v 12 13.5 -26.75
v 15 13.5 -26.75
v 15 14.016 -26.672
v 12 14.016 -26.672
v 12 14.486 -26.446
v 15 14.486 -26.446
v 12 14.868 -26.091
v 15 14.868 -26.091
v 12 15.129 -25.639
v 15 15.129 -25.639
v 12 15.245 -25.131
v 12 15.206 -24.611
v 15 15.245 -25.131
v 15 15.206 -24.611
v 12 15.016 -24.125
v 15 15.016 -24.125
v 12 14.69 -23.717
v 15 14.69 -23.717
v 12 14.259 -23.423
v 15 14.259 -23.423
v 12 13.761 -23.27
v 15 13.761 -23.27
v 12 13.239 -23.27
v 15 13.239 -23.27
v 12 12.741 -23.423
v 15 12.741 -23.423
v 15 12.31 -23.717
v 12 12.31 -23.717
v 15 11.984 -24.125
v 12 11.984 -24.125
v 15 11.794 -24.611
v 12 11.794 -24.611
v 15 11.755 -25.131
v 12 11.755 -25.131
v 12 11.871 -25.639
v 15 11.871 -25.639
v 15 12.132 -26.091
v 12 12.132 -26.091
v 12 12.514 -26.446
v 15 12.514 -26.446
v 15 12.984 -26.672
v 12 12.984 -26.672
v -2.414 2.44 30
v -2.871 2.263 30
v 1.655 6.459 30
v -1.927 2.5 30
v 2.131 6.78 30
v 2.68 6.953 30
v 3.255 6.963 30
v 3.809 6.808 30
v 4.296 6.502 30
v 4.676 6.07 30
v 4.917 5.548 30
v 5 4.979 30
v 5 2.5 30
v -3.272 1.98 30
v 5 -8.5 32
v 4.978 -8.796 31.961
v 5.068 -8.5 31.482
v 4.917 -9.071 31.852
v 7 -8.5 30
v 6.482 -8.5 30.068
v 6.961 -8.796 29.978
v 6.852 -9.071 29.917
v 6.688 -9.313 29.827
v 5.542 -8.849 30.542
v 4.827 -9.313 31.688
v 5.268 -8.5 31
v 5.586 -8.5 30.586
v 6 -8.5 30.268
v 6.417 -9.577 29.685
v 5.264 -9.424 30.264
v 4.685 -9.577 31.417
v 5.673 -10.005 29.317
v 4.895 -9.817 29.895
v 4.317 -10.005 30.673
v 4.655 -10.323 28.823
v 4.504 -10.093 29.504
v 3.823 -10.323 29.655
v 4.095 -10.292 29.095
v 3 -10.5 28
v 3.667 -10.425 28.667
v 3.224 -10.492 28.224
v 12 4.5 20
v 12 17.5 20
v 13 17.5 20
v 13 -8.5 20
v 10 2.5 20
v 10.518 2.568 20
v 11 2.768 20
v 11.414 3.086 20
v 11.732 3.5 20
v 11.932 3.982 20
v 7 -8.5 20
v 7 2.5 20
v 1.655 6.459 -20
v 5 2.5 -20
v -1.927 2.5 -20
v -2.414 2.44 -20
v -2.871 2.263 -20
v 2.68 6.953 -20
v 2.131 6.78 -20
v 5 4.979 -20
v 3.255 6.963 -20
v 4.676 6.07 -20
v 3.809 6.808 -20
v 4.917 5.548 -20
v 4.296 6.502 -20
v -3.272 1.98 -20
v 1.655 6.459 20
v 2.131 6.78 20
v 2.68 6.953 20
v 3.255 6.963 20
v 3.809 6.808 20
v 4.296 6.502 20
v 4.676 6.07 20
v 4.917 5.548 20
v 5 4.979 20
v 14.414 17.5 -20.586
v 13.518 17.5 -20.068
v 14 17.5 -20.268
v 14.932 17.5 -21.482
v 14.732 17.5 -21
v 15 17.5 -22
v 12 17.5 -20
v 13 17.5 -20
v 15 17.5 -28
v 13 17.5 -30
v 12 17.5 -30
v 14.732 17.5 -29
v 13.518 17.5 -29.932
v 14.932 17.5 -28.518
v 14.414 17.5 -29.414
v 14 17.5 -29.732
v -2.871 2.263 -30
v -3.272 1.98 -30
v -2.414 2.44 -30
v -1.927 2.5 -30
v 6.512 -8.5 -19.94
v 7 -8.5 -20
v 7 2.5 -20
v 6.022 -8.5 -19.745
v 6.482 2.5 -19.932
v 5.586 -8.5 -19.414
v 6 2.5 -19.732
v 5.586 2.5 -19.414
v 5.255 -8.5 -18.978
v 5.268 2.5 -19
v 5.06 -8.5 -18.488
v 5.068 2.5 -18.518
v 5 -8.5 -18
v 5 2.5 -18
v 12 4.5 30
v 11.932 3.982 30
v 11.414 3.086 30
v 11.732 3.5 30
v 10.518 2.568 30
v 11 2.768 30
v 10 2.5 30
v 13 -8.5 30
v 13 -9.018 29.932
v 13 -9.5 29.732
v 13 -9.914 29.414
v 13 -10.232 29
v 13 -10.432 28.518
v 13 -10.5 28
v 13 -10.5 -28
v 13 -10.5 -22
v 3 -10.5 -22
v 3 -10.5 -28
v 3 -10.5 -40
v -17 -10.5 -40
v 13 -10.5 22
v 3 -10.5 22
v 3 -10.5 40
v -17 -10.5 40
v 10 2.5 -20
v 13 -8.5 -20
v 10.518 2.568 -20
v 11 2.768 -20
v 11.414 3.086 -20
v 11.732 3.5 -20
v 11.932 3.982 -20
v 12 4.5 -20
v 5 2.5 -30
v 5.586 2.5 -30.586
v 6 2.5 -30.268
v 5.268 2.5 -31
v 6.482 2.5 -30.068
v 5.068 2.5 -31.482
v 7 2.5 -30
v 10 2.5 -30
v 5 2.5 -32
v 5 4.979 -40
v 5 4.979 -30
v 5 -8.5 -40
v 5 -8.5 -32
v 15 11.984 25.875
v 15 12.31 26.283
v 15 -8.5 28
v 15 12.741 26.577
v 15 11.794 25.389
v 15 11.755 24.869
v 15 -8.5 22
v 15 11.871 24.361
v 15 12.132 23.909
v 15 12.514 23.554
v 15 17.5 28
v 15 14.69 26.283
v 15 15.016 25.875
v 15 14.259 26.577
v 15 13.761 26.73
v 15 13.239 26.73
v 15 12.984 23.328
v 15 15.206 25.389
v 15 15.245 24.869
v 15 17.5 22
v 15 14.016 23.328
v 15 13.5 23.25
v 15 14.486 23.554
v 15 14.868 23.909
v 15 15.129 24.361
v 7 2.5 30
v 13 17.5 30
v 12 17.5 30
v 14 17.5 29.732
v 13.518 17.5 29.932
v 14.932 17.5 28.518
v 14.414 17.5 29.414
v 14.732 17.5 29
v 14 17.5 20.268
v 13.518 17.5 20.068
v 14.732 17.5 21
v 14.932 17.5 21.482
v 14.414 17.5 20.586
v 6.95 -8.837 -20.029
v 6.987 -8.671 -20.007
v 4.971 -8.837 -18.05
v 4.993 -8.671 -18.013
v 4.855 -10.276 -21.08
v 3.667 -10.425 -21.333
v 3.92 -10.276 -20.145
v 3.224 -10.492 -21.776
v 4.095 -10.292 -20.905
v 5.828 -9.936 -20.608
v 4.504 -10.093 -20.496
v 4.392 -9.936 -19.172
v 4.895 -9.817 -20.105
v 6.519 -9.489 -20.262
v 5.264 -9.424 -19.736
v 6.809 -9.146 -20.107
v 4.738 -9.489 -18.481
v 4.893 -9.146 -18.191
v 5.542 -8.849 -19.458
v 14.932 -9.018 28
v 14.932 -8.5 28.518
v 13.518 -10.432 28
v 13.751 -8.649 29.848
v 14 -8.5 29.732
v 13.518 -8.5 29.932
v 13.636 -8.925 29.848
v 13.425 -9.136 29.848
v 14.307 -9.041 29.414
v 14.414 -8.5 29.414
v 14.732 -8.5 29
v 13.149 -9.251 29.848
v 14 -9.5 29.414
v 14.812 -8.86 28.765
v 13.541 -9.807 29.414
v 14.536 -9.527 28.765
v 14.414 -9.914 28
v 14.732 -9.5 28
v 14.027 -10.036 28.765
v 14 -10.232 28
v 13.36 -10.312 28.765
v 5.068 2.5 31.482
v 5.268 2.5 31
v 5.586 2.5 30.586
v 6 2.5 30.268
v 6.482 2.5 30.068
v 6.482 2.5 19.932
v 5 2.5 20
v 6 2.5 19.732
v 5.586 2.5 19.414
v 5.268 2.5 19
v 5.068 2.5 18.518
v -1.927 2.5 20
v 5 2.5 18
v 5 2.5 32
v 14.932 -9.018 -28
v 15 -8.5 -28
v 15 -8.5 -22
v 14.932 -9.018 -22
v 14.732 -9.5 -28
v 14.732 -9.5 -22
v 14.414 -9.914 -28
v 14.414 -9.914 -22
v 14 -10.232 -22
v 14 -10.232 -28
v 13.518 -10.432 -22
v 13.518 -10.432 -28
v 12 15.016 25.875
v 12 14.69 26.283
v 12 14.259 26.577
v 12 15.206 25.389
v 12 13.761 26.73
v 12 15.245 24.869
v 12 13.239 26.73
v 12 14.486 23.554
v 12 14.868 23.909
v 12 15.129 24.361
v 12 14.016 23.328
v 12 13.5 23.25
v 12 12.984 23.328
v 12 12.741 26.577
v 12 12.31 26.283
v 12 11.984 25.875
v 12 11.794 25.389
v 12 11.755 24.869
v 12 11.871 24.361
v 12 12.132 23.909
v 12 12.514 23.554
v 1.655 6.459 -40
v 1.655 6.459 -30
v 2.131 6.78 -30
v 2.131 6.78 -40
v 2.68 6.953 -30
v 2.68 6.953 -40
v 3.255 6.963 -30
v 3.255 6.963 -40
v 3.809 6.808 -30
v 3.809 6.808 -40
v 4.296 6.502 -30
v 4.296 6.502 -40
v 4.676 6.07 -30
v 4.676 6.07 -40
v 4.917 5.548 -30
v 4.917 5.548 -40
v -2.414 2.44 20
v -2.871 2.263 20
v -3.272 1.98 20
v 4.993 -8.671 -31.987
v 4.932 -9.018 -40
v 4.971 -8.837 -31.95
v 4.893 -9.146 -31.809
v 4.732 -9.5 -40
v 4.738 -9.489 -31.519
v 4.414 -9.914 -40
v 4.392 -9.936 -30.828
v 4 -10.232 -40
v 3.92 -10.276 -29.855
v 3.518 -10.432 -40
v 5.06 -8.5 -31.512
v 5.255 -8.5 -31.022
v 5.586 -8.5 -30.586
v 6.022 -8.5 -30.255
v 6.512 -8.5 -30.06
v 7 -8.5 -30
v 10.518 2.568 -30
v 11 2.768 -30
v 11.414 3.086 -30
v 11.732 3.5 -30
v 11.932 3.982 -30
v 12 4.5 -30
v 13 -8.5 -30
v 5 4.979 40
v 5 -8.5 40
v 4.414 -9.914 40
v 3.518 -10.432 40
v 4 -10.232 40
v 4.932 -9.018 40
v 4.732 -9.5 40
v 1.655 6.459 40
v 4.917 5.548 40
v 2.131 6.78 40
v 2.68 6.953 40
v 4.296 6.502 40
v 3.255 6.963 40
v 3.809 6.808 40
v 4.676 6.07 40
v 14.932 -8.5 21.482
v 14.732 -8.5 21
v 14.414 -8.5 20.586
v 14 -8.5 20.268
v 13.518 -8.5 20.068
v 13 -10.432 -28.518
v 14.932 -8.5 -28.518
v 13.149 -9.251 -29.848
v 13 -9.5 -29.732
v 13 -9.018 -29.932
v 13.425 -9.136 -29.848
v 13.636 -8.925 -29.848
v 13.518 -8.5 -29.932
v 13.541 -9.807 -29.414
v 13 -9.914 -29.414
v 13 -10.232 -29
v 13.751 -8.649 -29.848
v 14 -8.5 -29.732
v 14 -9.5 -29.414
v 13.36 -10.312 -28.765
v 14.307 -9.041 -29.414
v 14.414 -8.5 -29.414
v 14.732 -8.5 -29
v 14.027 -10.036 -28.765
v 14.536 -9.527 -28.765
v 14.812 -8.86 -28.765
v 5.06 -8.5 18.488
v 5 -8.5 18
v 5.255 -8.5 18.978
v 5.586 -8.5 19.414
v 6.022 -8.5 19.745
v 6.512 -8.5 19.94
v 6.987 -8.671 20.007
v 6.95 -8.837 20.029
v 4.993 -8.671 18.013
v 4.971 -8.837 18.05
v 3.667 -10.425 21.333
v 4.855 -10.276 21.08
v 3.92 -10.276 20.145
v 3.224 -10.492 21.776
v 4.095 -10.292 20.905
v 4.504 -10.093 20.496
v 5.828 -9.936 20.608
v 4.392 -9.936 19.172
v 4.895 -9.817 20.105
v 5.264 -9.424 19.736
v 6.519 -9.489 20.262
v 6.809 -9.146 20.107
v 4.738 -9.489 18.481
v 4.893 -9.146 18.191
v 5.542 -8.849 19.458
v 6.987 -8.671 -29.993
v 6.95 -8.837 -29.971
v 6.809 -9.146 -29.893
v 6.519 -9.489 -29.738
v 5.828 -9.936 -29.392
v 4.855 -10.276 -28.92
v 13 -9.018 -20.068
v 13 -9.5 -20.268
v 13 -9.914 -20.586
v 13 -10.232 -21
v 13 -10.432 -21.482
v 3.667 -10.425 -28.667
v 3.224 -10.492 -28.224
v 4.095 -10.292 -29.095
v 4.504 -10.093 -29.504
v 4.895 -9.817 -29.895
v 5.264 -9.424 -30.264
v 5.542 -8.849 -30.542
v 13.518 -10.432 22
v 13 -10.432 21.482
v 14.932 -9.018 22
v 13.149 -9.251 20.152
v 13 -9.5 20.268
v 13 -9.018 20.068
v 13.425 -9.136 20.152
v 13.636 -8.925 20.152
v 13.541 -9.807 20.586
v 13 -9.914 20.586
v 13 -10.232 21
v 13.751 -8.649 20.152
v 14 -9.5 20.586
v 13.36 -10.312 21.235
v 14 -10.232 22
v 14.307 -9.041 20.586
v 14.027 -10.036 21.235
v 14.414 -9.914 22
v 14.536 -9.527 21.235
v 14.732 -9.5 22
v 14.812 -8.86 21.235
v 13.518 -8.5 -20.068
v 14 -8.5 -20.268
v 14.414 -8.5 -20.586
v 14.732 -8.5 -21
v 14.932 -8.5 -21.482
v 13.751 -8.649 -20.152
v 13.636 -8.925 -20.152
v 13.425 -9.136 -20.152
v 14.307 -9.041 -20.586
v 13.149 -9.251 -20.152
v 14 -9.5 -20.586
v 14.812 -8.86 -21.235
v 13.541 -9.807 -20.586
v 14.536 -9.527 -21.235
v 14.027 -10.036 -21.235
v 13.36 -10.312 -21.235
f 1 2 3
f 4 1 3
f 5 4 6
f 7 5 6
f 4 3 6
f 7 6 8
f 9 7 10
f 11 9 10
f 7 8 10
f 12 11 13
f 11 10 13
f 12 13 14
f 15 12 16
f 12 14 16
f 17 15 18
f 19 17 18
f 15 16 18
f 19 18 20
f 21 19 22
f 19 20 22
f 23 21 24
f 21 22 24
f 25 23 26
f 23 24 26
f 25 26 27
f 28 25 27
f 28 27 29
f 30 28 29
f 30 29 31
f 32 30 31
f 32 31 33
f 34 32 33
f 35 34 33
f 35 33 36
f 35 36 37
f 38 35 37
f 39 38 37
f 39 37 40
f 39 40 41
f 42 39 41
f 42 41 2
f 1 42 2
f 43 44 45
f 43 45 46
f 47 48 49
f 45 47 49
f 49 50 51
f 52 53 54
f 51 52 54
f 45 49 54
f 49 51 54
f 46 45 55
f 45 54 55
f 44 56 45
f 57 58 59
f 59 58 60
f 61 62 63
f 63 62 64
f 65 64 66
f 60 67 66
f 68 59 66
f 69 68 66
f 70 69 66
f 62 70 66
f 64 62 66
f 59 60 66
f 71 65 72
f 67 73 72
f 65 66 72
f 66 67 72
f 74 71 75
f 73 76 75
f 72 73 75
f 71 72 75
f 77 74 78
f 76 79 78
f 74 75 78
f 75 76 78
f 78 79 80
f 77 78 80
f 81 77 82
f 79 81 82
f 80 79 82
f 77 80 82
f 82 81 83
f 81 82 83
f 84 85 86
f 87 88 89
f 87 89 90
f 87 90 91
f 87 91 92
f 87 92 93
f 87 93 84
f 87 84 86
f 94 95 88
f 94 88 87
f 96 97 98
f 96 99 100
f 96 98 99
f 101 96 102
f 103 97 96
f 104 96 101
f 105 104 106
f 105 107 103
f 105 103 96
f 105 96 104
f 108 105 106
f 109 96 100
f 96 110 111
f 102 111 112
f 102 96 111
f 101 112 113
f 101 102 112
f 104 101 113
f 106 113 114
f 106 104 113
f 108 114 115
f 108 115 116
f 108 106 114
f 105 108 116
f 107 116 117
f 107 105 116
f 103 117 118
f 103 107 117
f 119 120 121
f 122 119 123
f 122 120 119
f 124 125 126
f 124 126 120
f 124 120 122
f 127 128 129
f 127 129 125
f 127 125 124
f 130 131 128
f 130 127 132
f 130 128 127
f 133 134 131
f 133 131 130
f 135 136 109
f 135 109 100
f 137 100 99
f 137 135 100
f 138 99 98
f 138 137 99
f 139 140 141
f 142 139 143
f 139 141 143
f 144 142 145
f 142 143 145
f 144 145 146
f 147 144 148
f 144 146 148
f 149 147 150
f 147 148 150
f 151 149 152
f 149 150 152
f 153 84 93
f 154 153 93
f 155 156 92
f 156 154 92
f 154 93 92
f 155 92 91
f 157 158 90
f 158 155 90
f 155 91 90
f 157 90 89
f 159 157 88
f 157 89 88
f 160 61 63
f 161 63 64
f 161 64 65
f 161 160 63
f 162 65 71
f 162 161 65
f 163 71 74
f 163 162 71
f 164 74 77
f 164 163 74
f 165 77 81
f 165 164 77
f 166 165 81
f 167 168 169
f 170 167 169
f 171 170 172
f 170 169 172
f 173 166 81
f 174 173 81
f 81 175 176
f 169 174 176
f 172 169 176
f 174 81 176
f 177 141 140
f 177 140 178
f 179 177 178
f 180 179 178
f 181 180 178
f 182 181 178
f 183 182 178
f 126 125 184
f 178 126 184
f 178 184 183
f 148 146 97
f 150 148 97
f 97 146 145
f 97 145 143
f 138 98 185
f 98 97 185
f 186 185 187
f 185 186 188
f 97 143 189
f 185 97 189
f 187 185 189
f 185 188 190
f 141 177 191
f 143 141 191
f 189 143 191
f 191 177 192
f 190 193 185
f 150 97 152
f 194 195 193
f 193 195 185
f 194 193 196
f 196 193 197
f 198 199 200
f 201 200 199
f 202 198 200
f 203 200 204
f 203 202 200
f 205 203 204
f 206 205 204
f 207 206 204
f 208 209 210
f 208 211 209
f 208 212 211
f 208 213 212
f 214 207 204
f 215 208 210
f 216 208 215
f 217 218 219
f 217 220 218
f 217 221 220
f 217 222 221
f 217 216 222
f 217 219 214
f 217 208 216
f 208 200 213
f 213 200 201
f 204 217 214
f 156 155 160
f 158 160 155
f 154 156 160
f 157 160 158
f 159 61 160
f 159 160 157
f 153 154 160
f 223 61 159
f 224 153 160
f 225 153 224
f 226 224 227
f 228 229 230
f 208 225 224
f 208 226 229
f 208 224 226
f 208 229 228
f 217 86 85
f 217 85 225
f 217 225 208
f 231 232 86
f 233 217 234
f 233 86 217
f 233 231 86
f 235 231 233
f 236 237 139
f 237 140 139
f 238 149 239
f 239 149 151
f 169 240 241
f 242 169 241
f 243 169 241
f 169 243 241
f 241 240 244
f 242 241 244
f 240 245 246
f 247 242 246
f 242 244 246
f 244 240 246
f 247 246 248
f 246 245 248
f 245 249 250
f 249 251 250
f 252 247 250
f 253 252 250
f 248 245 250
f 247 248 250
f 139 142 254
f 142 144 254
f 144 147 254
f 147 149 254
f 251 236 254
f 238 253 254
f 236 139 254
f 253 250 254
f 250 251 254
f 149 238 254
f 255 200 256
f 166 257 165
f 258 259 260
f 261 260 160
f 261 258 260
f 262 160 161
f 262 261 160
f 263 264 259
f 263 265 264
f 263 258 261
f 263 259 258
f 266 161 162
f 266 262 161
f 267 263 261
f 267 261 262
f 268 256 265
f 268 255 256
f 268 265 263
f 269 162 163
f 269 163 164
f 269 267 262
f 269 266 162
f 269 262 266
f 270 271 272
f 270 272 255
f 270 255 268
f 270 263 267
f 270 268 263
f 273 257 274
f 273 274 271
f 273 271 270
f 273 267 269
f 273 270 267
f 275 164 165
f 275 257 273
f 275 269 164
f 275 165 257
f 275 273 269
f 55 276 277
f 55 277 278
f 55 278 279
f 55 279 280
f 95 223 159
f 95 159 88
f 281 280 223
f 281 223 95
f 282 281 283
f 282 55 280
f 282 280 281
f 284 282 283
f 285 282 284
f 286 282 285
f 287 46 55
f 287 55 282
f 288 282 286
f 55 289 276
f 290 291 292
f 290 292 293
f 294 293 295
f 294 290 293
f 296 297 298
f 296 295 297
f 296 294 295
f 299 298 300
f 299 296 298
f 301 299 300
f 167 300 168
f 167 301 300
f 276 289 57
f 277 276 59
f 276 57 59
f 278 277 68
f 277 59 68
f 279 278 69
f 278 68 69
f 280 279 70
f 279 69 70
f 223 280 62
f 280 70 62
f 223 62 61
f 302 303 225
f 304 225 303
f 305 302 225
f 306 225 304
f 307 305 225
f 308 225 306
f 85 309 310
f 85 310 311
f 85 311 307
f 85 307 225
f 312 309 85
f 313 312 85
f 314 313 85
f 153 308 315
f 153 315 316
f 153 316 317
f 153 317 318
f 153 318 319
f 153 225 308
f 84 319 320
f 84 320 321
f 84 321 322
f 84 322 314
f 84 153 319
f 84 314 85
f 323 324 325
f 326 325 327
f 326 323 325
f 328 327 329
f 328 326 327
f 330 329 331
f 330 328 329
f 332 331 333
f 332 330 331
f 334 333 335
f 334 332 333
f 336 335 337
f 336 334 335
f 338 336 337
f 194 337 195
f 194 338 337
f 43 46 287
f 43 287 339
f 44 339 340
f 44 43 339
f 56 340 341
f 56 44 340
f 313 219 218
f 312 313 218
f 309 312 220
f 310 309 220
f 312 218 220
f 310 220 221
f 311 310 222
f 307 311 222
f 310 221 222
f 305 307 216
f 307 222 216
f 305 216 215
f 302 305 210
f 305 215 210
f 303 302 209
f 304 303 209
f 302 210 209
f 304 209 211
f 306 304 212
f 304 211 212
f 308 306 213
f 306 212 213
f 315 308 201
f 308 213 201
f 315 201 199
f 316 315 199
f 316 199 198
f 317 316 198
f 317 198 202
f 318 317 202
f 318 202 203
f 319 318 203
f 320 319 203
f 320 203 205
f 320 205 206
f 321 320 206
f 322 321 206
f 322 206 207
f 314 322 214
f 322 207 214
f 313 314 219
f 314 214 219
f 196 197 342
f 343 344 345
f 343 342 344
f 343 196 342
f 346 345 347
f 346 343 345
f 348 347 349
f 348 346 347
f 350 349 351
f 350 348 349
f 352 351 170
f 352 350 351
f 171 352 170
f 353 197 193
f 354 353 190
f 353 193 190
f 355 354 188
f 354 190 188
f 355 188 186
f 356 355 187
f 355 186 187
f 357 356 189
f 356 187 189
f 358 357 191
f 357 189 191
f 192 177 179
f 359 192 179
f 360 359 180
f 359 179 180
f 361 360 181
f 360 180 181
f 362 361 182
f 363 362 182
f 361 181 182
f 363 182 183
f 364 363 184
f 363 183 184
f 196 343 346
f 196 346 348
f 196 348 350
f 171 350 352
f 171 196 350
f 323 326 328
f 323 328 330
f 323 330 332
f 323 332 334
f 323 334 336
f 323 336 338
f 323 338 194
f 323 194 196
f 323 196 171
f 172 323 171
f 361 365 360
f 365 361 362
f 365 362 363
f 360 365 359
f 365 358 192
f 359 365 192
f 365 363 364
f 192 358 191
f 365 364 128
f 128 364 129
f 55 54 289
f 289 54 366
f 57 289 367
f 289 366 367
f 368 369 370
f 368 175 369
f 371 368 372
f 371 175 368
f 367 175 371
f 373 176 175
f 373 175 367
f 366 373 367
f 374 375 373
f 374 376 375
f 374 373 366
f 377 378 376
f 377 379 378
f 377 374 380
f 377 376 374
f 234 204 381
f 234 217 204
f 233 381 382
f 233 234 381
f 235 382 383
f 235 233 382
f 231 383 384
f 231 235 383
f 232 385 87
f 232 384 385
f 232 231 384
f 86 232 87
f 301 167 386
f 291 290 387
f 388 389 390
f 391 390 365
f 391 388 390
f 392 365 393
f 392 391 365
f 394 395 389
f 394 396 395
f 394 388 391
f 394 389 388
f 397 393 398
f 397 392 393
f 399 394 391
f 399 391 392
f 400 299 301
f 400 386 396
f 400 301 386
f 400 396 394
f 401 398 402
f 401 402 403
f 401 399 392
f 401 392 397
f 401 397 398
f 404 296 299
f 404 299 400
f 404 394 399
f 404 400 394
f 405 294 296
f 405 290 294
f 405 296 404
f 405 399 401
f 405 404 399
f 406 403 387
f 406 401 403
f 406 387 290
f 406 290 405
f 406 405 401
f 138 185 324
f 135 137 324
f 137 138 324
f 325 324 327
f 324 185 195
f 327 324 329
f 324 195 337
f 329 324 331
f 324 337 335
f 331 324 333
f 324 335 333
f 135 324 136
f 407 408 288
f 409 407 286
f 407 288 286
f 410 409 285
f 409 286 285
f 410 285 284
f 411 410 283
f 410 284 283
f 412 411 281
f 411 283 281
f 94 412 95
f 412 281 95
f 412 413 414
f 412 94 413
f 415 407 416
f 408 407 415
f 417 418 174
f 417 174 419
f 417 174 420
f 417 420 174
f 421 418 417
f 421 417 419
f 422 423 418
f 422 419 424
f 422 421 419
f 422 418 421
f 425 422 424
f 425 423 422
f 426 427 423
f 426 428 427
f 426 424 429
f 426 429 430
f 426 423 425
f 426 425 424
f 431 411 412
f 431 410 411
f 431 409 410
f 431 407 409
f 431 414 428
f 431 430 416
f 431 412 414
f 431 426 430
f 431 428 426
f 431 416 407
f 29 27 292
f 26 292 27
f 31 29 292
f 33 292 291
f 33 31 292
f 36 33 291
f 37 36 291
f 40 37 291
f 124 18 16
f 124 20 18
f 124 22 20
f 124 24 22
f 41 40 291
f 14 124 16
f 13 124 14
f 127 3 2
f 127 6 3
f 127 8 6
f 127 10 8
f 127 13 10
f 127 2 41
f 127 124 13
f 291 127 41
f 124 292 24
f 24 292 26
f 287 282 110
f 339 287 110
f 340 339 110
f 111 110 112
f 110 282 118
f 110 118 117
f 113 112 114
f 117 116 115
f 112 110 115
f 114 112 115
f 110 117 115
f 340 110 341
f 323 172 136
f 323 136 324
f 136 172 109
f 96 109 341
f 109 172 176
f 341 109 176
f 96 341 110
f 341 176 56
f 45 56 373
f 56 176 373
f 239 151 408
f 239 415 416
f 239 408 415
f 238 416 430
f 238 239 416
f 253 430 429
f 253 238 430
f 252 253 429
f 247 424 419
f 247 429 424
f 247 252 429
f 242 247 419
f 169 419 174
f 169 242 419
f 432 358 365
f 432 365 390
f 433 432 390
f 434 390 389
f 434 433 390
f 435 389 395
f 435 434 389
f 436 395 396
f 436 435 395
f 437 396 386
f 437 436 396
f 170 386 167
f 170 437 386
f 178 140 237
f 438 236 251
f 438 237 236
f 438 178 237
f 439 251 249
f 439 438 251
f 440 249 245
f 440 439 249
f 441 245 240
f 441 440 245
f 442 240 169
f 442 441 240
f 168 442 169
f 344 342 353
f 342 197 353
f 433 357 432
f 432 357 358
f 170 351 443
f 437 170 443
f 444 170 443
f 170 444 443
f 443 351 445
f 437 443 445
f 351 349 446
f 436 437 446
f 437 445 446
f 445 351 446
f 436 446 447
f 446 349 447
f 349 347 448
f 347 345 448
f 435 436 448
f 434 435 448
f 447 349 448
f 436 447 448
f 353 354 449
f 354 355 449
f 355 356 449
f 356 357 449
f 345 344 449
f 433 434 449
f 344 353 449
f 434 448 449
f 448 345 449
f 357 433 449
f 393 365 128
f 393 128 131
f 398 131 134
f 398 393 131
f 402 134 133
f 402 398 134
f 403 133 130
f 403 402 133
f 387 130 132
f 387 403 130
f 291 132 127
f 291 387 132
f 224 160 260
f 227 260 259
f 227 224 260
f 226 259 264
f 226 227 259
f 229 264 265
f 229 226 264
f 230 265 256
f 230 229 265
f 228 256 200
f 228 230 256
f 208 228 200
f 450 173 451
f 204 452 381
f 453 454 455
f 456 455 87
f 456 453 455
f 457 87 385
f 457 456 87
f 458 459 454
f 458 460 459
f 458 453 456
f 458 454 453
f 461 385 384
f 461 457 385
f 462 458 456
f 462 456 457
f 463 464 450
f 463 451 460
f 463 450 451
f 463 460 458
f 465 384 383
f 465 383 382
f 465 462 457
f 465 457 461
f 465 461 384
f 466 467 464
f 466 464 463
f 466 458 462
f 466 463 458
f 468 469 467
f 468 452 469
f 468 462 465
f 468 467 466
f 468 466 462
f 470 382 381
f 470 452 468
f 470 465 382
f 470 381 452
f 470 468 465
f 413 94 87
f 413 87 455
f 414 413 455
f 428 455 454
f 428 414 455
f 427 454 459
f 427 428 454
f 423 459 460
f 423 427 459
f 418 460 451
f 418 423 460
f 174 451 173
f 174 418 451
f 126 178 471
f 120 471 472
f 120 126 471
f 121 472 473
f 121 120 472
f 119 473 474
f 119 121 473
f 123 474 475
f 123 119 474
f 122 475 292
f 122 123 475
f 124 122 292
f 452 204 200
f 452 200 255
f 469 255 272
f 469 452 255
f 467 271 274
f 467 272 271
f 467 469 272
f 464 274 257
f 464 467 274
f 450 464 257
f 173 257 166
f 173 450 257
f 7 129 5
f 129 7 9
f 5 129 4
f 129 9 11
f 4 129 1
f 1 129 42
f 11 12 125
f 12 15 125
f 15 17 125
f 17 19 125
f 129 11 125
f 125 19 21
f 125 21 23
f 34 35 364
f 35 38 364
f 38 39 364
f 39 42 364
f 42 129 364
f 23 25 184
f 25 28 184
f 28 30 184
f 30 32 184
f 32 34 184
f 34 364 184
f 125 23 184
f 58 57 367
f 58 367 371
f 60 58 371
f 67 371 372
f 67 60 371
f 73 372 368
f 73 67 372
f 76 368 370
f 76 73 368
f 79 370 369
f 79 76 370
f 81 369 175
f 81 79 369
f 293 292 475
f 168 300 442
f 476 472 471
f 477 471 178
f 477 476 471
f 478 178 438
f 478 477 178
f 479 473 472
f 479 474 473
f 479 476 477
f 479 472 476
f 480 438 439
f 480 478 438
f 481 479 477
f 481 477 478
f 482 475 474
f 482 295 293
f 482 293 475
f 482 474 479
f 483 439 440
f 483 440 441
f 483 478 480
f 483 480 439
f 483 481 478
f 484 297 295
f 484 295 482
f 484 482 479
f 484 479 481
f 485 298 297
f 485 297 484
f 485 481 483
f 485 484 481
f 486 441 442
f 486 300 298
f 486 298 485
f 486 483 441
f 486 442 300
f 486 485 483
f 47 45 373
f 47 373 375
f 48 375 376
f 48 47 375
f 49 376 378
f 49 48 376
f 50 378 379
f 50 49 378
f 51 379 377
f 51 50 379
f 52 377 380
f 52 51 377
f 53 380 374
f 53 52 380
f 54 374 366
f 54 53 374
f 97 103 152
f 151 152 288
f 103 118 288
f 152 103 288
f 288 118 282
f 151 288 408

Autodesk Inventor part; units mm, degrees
ref_plane "YZ Plane" through (0, 0, 0) normal (1, 0, 0) x (0, 1, 0)
ref_plane "XZ Plane" through (0, 0, 0) normal (0, 1, 0) x (-1, 0, 0)
ref_plane "XY Plane" through (0, 0, 0) normal (0, 0, 1) x (1, 0, 0)
sketch "Esquisse1" plane through (0, 0, 0) normal (1, 0, 0) x (0, 1, 0)
  line L0 (-2.5, 65) -> (2.5, 65)
  line L1 (2.5, 65) -> (2.5, -65)
  line L2 (2.5, -65) -> (-2.5, -65)
  line L3 (-2.5, -65) -> (-2.5, 65)
  line L4 (2.5, 65) -> (-2.5, -65)
  line L5 (2.5, -65) -> (-2.5, 65)
  point P0 (0, 0)
  point P1 (0, 0)
  point P2 (0, 0)
  dimension "d0" = 130
  dimension "d1" = 5
extrude "Extrusion1" add sketch "Esquisse1" along normal blind 5
sketch "Esquisse2" plane through (5, 0, 0) normal (1, 0, 0) x (0, 0, -1)
  line L0 (65, 2.5) -> (-65, 2.5) projected
  line L1 (-65, -2.5) -> (65, -2.5) projected
  line L2 (-30, 2.5) -> (-20, 2.5)
  line L3 (-20, 2.5) -> (-20, -2.5)
  line L4 (-20, -2.5) -> (-30, -2.5)
  line L5 (-30, -2.5) -> (-30, 2.5)
  line L6 (0, 13) -> (0, -16)
  line L7 (30, 2.5) -> (20, 2.5)
  line L8 (20, 2.5) -> (20, -2.5)
  line L9 (20, -2.5) -> (30, -2.5)
  line L10 (30, -2.5) -> (30, 2.5)
  point P0 (0, 0)
  point P1 (-20, 2.5)
  point P2 (30, -2.5)
  point P3 (30, 2.5)
  point P4 (20, 2.5)
  point P5 (20, -2.5)
  dimension "d4" = 10
  dimension "d5" = 20
extrude "Extrusion2" add sketch "Esquisse2" along normal blind 10 contours L10 L1 L8 L0 | L3 L1 L5 L0
sketch "Esquisse3" plane through (0, 2.5, 65) normal (0, 1, 0) x (1, 0, 0)
  line L0 (15, 45) -> (15, 35) projected
  line L1 (5, 45) -> (15, 45) projected
  line L2 (15, 35) -> (12, 35)
  line L3 (12, 35) -> (12, 45)
  line L4 (12, 45) -> (15, 45)
  line L5 (15, 45) -> (15, 35)
  line L6 (-9, 65) -> (24, 65)
  line L7 (15, 85) -> (15, 95)
  line L8 (15, 95) -> (12, 95)
  line L9 (12, 95) -> (12, 85)
  line L10 (12, 85) -> (15, 85)
  line L11 (15, 85) -> (15, 95)
  point P0 (0, 65)
extrude "Extrusion3" add sketch "Esquisse3" along normal blind 15
sketch "Esquisse4" plane through (15, 0, 0) normal (1, 0, 0) x (0, 0, -1)
  circle A0 centre (-25, 13.5) radius 1.75
  line L0 (0, 20) -> (0, -21)
  circle A1 centre (25, 13.5) radius 1.75
  line L1 (-30, 17.5) -> (-20, 17.5) projected
  line L2 (-20, -2.5) -> (-20, 17.5) projected
  point P0 (0, 0)
  dimension "d10" = 3.5
  dimension "d11" = 4
  dimension "d19" = 5
extrude "Extrusion4" cut sketch "Esquisse4" against normal blind 10
sketch "Esquisse6" plane through (0, -2.5, 65) normal (0, 0, 1) x (1, 0, 0)
  line L0 (0, 0) -> (5, 0) projected
  line L1 (5, 0) -> (5, -8)
  line L2 (5, -8) -> (-17, -8)
  line L3 (-17, -8) -> (5, 12)
  line L4 (5, 0) -> (5, 5) projected
  line L5 (5, 12) -> (5, 0)
  point P0 (0, 2.5)
extrude "Extrusion6" add sketch "Esquisse6" against normal blind 130
sketch "Esquisse8" plane through (12, 2.5, 20) normal (-1, 0, 0) x (0, 0, 1)
  line L0 (0, -5) -> (0, 15) projected
  line L1 (0, 0) -> (10, 0) projected
  line L2 (0, 15) -> (10, 15)
  line L3 (10, 15) -> (10, 0)
  line L4 (10, 0) -> (0, 0)
  line L5 (0, 0) -> (0, 15)
  line L6 (-50, -5) -> (-50, 15) projected
  line L7 (-40, 0) -> (-40, 15) projected
  line L8 (-50, 15) -> (-40, 15)
  line L9 (-40, 15) -> (-40, 0)
  line L10 (-40, 0) -> (-50, 0)
  line L11 (-50, 0) -> (-50, 15)
  circle A0 centre (5, 6) radius 1.75
  point P0 (-20, -2.5)
extrude "Extrusion7" cut sketch "Esquisse8" along normal blind 130 contours L0 L2 L3 L1 | L6 L8 L7 L10 | A0
sketch "Esquisse10" plane through (5, -2.5, -30) normal (0, -1, 0) x (1, 0, 0)
  line L0 (10, 0) -> (7, 0) projected
  line L1 (0, 10) -> (7, 10) projected
  line L2 (10, 0) -> (0, 0)
  line L3 (0, 0) -> (0, 10)
  line L4 (0, 10) -> (10, 10)
  line L5 (10, 10) -> (10, 0)
  line L6 (0, 60) -> (7, 60) projected
  line L7 (10, 50) -> (0, 50)
  line L8 (0, 50) -> (0, 60)
  line L9 (0, 60) -> (10, 60)
  line L10 (10, 60) -> (10, 50)
  point P0 (-5, 30)
extrude "Extrusion8" add sketch "Esquisse10" along normal blind 8
fillet "Congé5" radius 2 20 edges at (15, -10.5, -25) (15, -10.5, 25) (5, -10.5, -47.5) (5, -10.5, 0) (5, -10.5, 47.5) (10, -10.5, 20) (10, -10.5, 30) (10, -10.5, -20) (10, -10.5, -30) (-6, -10.5, -65) (5, -0.5, -65) (-6, -0.5, -65) (5, 9.5, -47.5) (5, 9.5, 0) (5, 9.5, 47.5) (5, -0.5, 65) (15, 3.5, 30) (15, 3.5, 20) (15, 3.5, -20) (15, 3.5, -30)
fillet "Congé6" radius 2 10 edges at (8, -10.5, 28) (4.4142, -9.9142, 29.4142) (5, -3, 30) (4.4142, -9.9142, -20.5858) (5, -3, -20) (4.4142, -9.9142, 20.5858) (5, -3, 20) (8, -10.5, -28) (4.4142, -9.9142, -29.4142) (5, -3, -30)
fillet "Congé7" radius 2 2 edges at (12, 2.5, -25) (12, 2.5, 25)
fillet "Congé8" radius 2 2 edges at (-2.7, 2.5, -25) (-2.7, 2.5, 25)
sketch "Esquisse12" plane through (-17, -10.5, 65) normal (0, 0, 1) x (1, 0, 0)
  line L0 (0, 0) -> (22, 20)
  line L1 (22, 20) -> (22, 0)
  line L2 (22, 13) -> (22, 2) projected
  line L3 (22, 0) -> (0, 0)
  point P0 (17, 10.5)
extrude "Extrusion9" cut sketch "Esquisse12" against normal blind 25
sketch "Esquisse13" plane through (3, -8.5, -65) normal (0, 0, -1) x (-1, 0, 0)
  line L0 (0, -2) -> (20, -2) projected
  line L1 (20, -2) -> (-2, 18)
  line L2 (-2, 18) -> (-2, -2)
  line L3 (-2, 11) -> (-2, 0) projected
  line L4 (-2, -2) -> (20, -2)
  point P0 (3, 8.5)
extrude "Extrusion10" cut sketch "Esquisse13" against normal blind 25
properties part number "pare-chocs_Impression 3D"
